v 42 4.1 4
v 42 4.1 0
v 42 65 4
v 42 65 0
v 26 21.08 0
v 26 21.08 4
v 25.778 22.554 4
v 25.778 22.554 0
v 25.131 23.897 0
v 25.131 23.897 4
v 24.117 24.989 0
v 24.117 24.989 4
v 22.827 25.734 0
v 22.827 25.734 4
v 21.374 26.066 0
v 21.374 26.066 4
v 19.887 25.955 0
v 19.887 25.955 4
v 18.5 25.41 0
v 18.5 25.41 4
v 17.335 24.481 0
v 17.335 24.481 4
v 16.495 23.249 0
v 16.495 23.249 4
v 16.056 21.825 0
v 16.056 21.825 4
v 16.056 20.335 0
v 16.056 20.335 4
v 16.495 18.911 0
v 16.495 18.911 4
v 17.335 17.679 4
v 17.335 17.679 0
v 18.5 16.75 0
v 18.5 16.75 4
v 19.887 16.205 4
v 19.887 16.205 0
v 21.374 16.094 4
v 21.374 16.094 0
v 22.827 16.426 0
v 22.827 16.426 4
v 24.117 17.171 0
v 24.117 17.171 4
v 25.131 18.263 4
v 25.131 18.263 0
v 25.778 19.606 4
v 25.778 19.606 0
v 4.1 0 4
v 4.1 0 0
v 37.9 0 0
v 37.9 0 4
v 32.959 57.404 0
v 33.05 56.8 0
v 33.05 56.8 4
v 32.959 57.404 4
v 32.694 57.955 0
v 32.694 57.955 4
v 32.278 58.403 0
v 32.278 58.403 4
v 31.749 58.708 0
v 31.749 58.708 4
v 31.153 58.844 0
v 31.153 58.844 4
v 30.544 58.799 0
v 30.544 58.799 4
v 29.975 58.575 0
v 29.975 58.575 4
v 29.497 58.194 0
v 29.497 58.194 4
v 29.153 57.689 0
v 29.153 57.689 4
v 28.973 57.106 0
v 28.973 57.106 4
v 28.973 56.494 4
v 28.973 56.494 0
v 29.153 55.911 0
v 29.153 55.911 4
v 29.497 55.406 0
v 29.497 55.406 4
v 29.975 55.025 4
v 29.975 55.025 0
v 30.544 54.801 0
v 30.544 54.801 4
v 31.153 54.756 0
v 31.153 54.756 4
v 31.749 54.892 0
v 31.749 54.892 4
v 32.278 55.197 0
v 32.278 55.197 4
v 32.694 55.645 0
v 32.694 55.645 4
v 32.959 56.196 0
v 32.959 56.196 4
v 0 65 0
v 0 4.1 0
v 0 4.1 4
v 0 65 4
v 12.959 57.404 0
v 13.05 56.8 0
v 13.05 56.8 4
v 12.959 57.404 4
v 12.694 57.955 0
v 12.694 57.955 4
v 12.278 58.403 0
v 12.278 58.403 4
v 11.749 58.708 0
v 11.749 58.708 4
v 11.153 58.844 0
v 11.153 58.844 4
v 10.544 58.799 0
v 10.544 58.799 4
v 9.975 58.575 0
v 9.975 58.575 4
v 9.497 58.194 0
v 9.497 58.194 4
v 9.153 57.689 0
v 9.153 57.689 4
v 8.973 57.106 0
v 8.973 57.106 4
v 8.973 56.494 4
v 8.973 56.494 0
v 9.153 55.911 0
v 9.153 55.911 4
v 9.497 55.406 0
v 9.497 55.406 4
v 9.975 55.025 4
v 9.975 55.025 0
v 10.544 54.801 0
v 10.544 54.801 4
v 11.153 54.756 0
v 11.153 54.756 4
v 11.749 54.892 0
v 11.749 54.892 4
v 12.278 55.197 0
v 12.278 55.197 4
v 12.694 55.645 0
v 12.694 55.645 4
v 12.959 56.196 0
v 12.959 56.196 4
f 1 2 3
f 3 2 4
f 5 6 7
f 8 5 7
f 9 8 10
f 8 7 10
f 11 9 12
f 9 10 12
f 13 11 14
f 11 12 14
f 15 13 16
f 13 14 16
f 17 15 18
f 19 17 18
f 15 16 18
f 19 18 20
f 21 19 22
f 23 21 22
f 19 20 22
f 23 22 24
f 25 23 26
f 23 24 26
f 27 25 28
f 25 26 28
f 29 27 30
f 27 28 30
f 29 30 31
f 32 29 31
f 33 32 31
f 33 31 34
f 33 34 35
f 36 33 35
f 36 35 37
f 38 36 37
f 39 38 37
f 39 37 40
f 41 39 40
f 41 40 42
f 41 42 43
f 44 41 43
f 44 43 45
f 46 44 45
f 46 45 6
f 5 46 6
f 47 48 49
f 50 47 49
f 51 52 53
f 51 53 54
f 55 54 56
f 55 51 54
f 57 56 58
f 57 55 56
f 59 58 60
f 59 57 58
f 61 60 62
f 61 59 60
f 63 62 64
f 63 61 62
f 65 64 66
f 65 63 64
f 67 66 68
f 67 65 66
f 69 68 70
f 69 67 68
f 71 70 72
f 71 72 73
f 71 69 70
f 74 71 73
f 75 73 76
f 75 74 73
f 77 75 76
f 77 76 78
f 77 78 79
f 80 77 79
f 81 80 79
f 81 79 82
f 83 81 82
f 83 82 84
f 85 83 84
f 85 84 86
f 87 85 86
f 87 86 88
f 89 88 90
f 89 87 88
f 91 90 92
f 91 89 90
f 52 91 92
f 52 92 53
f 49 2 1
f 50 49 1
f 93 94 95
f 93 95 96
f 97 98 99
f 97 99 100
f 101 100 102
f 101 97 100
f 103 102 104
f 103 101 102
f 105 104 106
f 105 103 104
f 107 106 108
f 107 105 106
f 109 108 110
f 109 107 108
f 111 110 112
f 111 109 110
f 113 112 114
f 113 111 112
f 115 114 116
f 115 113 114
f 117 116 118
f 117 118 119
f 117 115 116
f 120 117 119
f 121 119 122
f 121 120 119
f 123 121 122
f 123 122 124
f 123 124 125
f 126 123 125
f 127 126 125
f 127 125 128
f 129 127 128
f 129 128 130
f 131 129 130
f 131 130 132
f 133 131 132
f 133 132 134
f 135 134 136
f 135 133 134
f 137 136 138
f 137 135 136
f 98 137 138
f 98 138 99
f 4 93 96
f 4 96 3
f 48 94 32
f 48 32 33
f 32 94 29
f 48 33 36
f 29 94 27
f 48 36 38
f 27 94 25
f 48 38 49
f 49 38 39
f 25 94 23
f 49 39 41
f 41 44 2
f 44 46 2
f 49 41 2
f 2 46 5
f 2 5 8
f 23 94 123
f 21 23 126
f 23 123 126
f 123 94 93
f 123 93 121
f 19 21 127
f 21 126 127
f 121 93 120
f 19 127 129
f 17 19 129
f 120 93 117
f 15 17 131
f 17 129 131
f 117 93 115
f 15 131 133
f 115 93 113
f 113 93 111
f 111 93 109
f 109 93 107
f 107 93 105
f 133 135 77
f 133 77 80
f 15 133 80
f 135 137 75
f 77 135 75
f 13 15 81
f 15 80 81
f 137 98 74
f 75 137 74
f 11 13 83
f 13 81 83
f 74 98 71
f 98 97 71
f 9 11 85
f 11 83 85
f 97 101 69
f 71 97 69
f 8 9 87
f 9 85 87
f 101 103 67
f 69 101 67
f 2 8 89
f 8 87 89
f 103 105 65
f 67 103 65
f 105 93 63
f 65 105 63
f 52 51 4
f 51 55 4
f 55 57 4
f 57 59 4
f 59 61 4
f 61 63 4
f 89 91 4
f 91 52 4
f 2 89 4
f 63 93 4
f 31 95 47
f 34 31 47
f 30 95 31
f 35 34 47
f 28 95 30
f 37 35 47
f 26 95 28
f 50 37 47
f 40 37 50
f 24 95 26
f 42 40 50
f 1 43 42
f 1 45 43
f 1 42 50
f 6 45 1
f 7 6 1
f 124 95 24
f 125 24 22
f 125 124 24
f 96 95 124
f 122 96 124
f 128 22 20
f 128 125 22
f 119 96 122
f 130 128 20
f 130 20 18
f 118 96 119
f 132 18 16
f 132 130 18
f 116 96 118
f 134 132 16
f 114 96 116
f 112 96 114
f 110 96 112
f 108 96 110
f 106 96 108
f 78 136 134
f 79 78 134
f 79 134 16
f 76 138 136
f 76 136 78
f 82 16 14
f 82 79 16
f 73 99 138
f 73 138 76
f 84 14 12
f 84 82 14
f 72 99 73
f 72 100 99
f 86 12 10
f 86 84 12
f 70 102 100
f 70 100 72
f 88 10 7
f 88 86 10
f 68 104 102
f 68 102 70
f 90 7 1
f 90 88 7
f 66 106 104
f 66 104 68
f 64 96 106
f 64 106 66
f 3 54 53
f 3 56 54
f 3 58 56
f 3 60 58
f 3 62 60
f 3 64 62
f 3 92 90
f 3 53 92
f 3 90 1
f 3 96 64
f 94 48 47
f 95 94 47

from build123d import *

# Parameters (mm, degrees)
CROQUIS1_W              = 42
CROQUIS1_H              = 65
CROQUIS1_R              = 2.05
SALIENTE_EXTRUIR1_DEPTH = 4
CHAFL_N1_SIZE           = 4.1
CROQUIS5_R              = 5
CORTAR_EXTRUIR2_DEPTH   = 5


with BuildPart() as part:
    # Croquis1 → Saliente-Extruir1 (new body)
    with BuildSketch(Plane.XY):
        with Locations((21, 32.5)):
            Rectangle(CROQUIS1_W, CROQUIS1_H)
        with Locations((11, 56.8)):
            Circle(CROQUIS1_R, mode=Mode.SUBTRACT)
        with Locations((31, 56.8)):
            Circle(CROQUIS1_R, mode=Mode.SUBTRACT)
    extrude(amount=SALIENTE_EXTRUIR1_DEPTH)

    # Chaflán1
    chafl_n1_edges = [part.edges().sort_by_distance(p)[0] for p in [
        (42, 0, 2),
        (0, 0, 2),
    ]]
    chamfer(chafl_n1_edges, length=CHAFL_N1_SIZE)

    # Croquis5 → Cortar-Extruir2 (cut, through all)
    with BuildSketch(Plane.XY.offset(4)):
        with Locations((21, 21.08)):
            Circle(CROQUIS5_R)
    extrude(amount=-CORTAR_EXTRUIR2_DEPTH, mode=Mode.SUBTRACT)


solid = part.part
